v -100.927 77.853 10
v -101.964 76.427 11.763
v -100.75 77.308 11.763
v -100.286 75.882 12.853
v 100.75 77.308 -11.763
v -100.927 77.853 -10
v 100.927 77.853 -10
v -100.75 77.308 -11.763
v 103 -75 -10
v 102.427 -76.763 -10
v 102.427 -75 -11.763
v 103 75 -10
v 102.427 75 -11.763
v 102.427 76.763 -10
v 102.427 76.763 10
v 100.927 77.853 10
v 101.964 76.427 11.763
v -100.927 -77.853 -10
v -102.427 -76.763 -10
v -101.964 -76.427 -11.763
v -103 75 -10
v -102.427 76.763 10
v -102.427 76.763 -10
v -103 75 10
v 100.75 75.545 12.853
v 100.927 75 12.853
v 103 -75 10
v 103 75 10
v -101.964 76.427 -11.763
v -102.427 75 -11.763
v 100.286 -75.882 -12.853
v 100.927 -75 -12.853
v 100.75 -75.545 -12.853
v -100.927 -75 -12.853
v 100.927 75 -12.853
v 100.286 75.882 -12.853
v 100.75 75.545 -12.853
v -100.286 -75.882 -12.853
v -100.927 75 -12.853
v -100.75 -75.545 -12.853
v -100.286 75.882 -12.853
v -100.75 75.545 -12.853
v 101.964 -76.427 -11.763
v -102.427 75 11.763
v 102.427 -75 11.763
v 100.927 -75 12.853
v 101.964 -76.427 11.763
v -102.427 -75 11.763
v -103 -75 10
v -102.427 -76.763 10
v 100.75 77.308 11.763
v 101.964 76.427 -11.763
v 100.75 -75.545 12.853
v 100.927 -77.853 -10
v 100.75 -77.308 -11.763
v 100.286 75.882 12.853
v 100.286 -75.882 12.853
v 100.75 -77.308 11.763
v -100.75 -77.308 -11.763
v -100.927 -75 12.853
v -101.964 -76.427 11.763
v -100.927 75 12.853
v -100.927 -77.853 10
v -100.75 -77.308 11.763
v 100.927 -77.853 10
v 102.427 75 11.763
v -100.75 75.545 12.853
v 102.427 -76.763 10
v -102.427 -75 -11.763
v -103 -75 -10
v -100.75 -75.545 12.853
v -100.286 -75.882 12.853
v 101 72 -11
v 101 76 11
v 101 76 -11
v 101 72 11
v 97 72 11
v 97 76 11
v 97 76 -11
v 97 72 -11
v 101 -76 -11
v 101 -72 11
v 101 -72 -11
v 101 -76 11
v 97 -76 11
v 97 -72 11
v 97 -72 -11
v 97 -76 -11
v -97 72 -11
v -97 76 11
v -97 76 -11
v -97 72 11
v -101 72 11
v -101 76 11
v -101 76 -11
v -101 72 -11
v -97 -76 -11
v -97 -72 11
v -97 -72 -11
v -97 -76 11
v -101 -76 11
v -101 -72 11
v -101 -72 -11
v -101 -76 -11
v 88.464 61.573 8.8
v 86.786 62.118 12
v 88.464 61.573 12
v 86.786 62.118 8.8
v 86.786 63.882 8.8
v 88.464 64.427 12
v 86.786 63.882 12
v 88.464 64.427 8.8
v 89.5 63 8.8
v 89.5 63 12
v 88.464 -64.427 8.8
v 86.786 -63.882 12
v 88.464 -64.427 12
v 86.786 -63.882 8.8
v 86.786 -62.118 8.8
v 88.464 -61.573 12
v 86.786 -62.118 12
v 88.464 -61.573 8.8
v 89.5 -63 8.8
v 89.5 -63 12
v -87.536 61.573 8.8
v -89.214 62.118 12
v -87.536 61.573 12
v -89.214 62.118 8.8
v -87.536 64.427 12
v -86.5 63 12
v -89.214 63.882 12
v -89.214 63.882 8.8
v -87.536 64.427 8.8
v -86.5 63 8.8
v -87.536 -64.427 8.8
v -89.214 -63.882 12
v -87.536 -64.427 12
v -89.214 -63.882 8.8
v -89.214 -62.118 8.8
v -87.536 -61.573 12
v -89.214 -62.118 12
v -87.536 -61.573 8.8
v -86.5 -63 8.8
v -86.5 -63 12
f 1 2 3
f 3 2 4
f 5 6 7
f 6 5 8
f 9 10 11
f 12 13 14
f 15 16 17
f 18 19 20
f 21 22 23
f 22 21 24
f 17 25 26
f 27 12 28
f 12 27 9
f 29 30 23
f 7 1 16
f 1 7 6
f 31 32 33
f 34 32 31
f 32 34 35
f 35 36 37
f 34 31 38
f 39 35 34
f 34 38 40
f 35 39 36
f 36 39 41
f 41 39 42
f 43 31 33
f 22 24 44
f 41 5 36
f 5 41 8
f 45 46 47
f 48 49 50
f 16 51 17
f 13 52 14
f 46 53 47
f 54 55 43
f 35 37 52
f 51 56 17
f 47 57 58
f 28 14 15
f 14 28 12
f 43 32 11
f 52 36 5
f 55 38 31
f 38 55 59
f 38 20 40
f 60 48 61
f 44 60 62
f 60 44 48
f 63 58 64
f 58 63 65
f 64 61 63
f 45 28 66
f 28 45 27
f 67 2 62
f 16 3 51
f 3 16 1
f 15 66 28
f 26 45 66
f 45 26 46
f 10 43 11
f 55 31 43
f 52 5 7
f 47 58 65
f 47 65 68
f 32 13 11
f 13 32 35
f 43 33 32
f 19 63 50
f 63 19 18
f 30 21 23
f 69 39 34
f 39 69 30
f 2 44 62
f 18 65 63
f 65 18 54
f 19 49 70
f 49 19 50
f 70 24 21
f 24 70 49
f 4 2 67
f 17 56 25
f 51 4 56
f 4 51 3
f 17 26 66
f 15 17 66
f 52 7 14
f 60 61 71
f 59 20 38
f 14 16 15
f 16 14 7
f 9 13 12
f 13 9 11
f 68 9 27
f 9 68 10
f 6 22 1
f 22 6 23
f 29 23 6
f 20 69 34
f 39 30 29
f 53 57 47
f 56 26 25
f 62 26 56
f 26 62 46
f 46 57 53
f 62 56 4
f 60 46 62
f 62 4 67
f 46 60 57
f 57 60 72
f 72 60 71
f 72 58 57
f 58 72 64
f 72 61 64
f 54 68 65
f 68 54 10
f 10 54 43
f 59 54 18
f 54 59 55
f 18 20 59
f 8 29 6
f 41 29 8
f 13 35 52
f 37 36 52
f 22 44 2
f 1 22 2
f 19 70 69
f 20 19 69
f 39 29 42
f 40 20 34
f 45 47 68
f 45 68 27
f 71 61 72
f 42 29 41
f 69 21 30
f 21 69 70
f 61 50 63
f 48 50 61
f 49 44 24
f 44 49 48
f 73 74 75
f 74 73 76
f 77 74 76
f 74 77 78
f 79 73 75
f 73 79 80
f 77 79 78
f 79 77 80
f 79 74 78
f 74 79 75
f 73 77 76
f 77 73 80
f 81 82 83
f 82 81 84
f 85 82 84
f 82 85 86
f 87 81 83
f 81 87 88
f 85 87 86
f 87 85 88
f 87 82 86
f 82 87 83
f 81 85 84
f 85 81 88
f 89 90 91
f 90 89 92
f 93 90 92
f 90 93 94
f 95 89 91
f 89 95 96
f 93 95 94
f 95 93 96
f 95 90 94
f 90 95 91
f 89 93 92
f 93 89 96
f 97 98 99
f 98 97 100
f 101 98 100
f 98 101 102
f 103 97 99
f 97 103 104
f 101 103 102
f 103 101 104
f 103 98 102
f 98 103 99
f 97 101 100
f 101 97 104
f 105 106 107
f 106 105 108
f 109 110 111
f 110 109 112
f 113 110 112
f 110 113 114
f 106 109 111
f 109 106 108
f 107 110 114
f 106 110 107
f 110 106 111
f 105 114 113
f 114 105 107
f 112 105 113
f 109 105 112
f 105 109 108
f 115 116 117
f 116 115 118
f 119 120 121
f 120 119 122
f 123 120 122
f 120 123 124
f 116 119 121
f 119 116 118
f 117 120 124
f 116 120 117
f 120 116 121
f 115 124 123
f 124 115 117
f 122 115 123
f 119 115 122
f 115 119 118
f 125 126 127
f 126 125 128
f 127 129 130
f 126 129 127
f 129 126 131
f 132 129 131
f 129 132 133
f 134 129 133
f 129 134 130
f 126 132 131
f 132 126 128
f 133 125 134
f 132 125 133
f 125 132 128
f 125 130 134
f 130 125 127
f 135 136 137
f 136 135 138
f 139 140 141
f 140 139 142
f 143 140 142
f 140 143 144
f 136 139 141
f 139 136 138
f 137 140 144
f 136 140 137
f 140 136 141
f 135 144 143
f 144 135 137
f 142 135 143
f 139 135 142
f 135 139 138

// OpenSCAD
// Parameters
sheet_L = 200; //[100:400:1]
sheet_W = 150; //[75:300:1]
sheet_T = 20; //[10:40:1]
edge_radius = 3; //[1.5:6:0.5]
corner_chamfer = 4; //[2:8:0.5]
overlap = 1; //[0.5:2:0.5]
pore_radius = 1.5; //[0.8:3:0.1]
pore_depth = 1.2; //[0.5:3:0.1]
pore_margin = 12; //[6:24:1]
branding_size = 30; //[15:60:1]
branding_height = 1.2; //[0.5:3:0.1]

// Foam Sheet Body
module foam_sheet_body() {
  cube([sheet_L, sheet_W, sheet_T], center=true);
}

// Edge Rounding
module edge_rounding() {
  sphere(r=edge_radius, center=true);
}

// Corner Chamfers
module corner_chamfers() {
  cube([corner_chamfer, corner_chamfer, sheet_T + 2*overlap], center=true);
}

// Surface Pores Texture
module surface_pores_texture() {
  cylinder(r=pore_radius, h=pore_depth + 2*overlap, center=true);
}

// Branding Emboss
module branding_emboss() {
  cube([branding_size, branding_size, branding_height], center=true);
}

// Foam Sheet with Rounded Edges
module foam_sheet_rounded() {
  minkowski() {
    foam_sheet_body();
    edge_rounding();
  }
}

// Foam Sheet with Chamfers
module foam_sheet_with_chamfers() {
  difference() {
    foam_sheet_rounded();
    translate([sheet_L/2 - corner_chamfer/2 + overlap, sheet_W/2 - corner_chamfer/2 + overlap, 0])
      corner_chamfers();
    translate([sheet_L/2 - corner_chamfer/2 + overlap, -sheet_W/2 + corner_chamfer/2 - overlap, 0])
      corner_chamfers();
    translate([-sheet_L/2 + corner_chamfer/2 - overlap, sheet_W/2 - corner_chamfer/2 + overlap, 0])
      corner_chamfers();
    translate([-sheet_L/2 + corner_chamfer/2 - overlap, -sheet_W/2 + corner_chamfer/2 - overlap, 0])
      corner_chamfers();
  }
}

// Foam Sheet with Pores
module foam_sheet_with_pores() {
  difference() {
    foam_sheet_with_chamfers();
    translate([sheet_L/2 - pore_margin, sheet_W/2 - pore_margin, sheet_T/2 - pore_depth/2 + overlap])
      surface_pores_texture();
    translate([sheet_L/2 - pore_margin, -sheet_W/2 + pore_margin, sheet_T/2 - pore_depth/2 + overlap])
      surface_pores_texture();
    translate([-sheet_L/2 + pore_margin, sheet_W/2 - pore_margin, sheet_T/2 - pore_depth/2 + overlap])
      surface_pores_texture();
    translate([-sheet_L/2 + pore_margin, -sheet_W/2 + pore_margin, sheet_T/2 - pore_depth/2 + overlap])
      surface_pores_texture();
  }
}

// Complete Model with Branding
module complete_model() {
  union() {
    foam_sheet_with_pores();
    translate([0, 0, sheet_T/2 + branding_height/2 - overlap])
      branding_emboss();
  }
}

// Render the complete model
complete_model();
